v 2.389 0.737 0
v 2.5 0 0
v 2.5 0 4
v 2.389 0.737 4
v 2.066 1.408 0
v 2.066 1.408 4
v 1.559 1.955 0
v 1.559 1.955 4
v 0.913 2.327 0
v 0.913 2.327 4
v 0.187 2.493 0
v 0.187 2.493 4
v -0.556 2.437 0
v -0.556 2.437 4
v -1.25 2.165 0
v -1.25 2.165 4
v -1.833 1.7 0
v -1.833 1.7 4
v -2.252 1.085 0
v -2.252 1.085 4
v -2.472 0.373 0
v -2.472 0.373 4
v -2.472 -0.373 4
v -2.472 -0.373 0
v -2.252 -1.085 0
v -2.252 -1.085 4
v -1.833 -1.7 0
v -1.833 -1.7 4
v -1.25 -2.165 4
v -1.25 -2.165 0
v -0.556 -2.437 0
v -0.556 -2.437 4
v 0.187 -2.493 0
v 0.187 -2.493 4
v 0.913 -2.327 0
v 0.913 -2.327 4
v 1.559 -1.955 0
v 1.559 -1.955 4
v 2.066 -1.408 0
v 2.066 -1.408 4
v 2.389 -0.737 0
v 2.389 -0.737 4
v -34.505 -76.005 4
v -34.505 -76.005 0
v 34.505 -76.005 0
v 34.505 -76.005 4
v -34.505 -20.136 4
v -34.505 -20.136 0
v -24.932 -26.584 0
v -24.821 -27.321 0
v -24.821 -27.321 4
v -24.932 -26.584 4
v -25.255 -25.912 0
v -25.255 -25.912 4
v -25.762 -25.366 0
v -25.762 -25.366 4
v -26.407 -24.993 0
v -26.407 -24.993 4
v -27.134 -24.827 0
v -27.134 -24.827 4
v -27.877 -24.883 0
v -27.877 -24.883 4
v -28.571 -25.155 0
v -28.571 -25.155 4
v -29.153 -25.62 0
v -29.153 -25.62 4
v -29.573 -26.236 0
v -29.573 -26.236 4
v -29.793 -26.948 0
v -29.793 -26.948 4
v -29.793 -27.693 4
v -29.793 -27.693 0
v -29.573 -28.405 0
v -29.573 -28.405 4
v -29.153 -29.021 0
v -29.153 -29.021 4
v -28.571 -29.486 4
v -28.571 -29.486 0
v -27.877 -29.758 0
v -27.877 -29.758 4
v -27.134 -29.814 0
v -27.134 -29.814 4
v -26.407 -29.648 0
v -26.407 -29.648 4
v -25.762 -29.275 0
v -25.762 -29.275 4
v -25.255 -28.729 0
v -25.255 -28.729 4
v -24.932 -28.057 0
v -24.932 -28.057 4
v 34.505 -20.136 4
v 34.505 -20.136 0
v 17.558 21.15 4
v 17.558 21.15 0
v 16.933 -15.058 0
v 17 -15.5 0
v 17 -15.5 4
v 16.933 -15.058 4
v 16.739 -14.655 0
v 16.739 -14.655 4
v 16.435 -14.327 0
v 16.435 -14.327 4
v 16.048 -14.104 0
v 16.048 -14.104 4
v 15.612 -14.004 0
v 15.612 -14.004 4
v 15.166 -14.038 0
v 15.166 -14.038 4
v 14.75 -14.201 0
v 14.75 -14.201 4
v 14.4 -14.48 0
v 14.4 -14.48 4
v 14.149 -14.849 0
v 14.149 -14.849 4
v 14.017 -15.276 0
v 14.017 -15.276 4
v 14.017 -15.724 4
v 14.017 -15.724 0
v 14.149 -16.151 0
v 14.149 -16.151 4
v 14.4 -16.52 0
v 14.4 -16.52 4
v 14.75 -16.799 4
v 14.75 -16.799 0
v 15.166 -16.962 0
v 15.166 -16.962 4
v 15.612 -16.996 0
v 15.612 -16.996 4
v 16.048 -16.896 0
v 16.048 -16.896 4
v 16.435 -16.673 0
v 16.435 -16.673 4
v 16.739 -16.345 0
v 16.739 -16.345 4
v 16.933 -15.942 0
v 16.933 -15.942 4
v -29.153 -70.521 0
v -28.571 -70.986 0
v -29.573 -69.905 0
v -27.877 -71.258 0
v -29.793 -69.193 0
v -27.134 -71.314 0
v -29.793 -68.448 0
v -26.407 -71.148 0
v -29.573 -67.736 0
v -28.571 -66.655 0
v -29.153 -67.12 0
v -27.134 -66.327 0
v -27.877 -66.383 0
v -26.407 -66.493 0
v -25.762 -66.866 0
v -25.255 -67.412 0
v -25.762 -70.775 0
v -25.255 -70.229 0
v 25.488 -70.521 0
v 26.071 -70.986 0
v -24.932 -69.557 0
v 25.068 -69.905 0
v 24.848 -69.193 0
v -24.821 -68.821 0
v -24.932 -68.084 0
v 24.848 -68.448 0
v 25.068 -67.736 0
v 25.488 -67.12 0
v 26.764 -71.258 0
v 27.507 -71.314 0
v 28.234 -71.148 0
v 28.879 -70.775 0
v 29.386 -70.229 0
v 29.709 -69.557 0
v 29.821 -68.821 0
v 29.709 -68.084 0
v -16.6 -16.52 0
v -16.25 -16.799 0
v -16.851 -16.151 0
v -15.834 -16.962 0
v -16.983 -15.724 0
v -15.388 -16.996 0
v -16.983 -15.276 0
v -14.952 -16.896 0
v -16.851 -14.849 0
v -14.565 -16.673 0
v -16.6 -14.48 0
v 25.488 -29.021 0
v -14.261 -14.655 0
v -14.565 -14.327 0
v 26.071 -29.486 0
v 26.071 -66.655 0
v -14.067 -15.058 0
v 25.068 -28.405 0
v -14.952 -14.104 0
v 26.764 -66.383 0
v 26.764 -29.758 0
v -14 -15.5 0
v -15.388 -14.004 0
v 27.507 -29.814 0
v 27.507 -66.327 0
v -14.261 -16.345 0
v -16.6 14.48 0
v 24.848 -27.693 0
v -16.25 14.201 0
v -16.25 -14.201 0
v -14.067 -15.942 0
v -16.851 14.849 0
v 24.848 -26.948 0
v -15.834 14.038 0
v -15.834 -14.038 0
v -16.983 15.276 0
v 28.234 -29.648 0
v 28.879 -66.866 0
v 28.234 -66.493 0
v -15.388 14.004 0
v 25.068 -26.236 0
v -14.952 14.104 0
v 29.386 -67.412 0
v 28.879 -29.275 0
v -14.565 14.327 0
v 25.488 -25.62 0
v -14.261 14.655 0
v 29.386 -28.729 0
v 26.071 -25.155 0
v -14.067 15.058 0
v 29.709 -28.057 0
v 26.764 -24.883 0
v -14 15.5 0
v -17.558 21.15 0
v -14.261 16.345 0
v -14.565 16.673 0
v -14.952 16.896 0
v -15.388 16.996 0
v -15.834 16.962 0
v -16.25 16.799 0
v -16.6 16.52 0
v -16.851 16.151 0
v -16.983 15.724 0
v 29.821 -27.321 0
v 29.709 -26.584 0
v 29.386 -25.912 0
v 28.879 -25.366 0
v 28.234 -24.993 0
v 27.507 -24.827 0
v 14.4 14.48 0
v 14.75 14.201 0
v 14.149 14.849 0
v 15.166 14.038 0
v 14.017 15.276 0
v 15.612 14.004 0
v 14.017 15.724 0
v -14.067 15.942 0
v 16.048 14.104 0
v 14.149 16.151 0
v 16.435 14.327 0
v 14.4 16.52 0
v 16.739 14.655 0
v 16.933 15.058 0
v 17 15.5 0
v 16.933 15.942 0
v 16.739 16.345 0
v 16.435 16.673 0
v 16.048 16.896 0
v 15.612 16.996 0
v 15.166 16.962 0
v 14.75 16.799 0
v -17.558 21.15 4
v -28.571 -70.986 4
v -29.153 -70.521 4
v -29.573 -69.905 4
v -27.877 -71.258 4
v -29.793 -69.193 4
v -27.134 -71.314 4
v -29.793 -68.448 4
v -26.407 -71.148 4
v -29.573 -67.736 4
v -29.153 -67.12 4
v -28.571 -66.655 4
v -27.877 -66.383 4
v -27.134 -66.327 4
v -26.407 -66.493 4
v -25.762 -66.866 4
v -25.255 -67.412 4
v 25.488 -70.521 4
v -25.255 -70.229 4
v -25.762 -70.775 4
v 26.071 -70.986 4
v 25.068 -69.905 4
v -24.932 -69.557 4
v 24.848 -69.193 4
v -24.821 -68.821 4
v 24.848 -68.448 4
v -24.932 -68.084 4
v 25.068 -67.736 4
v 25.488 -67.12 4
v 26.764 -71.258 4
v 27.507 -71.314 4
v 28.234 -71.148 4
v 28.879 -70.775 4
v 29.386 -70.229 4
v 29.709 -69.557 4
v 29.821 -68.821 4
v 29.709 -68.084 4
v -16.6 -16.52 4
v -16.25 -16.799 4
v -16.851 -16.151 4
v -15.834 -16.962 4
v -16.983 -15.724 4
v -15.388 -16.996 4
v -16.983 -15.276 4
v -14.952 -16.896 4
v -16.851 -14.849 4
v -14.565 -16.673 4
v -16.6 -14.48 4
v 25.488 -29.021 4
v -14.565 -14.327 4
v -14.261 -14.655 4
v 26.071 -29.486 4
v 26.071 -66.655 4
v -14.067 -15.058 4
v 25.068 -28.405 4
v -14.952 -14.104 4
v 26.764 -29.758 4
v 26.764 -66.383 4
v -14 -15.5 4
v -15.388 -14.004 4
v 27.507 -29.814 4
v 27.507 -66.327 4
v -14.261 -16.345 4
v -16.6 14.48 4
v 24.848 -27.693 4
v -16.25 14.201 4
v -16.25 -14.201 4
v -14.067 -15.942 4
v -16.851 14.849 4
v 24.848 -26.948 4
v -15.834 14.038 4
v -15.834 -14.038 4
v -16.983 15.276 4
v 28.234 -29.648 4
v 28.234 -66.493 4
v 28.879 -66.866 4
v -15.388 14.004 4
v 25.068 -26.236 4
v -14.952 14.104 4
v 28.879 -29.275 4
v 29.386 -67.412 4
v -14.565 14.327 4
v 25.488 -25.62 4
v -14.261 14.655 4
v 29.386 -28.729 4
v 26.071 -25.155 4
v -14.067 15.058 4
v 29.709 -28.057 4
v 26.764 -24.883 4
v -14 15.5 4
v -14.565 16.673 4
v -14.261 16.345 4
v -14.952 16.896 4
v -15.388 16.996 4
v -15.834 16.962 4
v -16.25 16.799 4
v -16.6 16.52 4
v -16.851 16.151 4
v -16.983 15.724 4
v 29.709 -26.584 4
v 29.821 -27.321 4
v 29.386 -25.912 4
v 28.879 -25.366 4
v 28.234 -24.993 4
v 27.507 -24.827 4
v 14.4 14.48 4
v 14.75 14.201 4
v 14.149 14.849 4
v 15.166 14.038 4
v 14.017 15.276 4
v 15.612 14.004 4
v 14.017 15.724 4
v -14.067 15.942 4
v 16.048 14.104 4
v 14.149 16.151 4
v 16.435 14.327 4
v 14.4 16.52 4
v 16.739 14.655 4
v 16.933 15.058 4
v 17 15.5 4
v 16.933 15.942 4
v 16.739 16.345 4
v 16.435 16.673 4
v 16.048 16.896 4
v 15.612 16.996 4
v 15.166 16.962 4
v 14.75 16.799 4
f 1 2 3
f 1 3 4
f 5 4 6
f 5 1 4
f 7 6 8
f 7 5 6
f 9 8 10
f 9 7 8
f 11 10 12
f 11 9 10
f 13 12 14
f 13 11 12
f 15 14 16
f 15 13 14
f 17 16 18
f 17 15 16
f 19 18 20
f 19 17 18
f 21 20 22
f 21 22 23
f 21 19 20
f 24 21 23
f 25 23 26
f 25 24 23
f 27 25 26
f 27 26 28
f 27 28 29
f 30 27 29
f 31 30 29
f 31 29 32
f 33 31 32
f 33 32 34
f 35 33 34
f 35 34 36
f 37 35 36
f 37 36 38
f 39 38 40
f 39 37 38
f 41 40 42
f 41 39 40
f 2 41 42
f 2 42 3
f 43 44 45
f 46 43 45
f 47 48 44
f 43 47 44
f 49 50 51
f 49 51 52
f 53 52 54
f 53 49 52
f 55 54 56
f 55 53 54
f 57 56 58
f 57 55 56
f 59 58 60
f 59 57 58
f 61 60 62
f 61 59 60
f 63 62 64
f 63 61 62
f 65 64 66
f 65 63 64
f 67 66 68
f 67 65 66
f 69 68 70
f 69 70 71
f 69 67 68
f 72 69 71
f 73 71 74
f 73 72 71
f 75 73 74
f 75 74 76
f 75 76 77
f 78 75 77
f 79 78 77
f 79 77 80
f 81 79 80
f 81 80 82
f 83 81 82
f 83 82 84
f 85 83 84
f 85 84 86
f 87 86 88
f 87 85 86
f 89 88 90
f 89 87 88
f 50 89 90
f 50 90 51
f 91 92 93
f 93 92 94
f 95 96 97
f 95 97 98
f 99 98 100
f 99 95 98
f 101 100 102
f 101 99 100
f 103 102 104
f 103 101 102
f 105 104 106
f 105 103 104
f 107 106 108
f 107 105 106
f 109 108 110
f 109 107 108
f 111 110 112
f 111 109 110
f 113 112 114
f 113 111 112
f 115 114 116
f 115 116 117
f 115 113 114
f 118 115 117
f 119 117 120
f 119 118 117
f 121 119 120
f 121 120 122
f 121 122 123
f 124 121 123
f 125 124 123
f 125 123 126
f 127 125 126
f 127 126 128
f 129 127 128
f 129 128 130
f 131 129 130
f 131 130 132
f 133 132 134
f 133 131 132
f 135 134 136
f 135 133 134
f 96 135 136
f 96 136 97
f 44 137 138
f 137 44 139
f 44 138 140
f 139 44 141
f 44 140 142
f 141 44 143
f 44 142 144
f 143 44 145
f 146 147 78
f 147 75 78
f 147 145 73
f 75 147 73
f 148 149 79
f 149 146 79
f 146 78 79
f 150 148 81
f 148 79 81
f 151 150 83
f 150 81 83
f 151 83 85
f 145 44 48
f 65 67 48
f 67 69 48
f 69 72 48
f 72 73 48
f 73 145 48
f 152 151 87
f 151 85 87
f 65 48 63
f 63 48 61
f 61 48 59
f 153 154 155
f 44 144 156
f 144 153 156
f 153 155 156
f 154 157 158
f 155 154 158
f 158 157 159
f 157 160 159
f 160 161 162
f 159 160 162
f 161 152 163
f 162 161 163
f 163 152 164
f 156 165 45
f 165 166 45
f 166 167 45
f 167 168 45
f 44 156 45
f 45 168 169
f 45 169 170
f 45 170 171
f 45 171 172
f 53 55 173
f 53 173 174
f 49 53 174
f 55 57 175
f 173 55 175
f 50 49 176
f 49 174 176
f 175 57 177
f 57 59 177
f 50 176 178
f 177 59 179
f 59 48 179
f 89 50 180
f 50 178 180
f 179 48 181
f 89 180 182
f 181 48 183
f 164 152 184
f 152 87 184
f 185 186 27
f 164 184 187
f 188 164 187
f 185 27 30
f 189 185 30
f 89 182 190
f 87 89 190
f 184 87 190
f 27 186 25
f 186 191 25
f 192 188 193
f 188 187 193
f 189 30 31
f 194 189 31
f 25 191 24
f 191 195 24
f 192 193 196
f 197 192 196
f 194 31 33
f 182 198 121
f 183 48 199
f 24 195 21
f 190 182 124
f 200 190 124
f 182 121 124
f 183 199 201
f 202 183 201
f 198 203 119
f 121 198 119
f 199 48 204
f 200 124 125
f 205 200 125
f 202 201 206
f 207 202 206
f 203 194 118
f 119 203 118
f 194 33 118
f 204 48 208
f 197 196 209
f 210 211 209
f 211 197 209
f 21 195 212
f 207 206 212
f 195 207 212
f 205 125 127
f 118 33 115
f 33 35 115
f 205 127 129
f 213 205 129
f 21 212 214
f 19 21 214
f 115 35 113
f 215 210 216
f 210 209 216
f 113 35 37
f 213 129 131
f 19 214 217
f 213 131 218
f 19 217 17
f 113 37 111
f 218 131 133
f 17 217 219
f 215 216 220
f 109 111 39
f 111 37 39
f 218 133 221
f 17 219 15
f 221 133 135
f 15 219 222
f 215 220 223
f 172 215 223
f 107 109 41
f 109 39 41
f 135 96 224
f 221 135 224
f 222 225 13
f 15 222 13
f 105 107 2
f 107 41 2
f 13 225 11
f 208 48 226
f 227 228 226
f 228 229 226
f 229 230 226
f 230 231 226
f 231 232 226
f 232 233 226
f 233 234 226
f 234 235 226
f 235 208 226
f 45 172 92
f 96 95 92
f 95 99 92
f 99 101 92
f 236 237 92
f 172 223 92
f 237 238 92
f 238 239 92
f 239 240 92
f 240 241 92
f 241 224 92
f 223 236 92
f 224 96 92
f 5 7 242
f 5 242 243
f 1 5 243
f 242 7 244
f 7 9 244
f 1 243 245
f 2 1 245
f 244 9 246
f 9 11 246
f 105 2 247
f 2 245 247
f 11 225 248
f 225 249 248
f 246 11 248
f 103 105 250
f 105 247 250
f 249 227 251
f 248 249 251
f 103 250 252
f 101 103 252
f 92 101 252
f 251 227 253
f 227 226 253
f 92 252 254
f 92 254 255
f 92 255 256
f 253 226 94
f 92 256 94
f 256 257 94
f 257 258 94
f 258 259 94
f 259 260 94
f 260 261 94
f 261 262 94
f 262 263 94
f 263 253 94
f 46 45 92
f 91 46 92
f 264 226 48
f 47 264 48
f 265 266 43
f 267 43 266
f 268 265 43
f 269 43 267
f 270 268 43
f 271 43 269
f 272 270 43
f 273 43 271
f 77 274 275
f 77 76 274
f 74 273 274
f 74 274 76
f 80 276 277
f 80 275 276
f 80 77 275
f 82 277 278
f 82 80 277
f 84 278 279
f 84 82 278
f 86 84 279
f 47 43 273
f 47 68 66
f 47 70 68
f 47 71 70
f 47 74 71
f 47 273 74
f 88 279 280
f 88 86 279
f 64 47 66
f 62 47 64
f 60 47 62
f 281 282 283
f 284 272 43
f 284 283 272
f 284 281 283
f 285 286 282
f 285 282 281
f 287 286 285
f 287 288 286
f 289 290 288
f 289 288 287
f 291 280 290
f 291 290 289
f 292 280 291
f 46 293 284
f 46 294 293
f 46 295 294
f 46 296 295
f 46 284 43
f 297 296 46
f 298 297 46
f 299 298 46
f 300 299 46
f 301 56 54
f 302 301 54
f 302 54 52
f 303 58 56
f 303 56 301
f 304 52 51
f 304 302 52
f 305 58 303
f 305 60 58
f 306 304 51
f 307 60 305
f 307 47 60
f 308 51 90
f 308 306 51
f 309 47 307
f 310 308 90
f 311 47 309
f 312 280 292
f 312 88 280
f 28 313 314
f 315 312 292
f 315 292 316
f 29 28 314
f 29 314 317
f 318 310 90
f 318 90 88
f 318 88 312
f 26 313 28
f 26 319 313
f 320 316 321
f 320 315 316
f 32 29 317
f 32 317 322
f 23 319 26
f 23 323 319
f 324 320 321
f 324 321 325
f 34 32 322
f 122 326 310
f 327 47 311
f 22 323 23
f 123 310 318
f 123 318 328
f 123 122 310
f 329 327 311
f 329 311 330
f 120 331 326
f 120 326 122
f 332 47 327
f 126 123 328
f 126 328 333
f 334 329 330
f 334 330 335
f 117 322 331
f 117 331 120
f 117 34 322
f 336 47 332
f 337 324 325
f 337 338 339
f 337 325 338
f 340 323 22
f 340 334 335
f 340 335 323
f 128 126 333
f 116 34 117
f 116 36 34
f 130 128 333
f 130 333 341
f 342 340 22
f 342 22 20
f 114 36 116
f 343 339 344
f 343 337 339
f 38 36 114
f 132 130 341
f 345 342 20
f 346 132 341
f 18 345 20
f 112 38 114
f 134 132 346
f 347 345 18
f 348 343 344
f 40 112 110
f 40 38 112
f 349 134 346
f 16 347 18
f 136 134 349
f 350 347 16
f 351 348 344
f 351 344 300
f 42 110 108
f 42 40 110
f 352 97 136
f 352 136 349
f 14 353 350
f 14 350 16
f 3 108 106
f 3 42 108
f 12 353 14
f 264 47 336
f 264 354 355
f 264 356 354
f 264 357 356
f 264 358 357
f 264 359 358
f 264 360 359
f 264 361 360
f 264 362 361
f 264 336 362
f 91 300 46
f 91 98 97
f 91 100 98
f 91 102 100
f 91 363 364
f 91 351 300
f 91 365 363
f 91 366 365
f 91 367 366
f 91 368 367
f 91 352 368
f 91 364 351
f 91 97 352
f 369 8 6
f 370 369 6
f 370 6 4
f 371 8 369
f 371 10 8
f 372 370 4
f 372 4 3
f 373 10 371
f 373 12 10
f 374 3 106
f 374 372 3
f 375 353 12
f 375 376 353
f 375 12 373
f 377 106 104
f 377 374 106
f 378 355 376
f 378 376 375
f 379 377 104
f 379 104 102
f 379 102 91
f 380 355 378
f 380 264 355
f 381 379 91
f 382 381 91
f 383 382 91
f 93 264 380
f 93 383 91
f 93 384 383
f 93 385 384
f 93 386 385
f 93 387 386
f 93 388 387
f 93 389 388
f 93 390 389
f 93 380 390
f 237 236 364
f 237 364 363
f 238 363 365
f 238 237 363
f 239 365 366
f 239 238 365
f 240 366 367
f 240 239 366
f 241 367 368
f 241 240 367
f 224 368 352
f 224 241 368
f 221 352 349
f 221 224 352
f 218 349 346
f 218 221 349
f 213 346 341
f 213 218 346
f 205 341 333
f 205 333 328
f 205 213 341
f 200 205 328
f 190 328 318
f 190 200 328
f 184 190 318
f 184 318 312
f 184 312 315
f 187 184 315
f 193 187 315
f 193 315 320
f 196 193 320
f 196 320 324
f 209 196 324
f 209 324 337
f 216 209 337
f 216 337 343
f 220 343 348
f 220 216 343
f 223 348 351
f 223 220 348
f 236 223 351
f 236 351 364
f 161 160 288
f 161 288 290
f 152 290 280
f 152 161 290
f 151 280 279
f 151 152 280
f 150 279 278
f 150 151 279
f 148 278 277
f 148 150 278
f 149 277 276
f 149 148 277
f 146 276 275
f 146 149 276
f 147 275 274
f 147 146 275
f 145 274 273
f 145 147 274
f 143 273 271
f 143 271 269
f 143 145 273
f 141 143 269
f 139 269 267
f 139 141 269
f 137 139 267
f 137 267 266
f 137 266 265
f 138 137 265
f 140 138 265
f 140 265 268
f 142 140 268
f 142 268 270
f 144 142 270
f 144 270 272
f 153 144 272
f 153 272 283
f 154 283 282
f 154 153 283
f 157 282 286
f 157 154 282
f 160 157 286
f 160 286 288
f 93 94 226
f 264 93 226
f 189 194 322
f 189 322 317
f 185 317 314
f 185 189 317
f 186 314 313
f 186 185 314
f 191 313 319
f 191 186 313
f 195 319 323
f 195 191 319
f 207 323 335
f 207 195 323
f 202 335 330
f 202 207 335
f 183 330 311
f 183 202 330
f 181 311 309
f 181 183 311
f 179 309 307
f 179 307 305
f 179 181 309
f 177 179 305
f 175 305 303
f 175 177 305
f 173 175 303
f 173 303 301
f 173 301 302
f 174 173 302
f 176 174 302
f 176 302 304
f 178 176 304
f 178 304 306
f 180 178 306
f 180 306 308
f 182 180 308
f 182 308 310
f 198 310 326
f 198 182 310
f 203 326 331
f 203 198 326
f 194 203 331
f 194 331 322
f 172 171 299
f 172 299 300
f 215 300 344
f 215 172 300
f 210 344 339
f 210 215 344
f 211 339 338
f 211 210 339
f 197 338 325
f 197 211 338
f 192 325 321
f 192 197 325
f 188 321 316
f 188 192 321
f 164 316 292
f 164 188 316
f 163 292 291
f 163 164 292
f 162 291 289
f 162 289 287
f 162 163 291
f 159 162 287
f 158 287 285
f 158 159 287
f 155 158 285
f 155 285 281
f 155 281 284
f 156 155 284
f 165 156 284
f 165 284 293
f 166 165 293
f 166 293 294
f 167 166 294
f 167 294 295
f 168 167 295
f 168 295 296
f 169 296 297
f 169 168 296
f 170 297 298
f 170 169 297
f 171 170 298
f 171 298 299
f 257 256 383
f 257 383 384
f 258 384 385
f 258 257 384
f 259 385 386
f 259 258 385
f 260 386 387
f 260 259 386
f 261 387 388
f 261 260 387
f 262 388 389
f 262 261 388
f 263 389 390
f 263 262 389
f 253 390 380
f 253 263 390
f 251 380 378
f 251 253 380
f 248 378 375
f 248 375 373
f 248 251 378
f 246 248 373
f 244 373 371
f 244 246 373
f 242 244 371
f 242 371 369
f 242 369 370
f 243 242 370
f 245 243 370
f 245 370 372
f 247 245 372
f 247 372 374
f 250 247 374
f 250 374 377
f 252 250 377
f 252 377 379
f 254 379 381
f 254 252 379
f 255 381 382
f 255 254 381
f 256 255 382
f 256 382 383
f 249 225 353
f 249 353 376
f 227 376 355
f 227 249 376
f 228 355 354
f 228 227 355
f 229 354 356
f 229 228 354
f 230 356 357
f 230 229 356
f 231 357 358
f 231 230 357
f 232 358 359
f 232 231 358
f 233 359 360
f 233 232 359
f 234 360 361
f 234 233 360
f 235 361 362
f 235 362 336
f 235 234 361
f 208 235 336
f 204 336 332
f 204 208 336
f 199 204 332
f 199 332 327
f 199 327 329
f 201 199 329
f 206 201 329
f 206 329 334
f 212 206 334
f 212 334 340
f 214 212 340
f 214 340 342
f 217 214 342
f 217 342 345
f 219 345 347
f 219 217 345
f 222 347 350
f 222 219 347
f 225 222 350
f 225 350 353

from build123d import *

# Parameters (mm, degrees)
SKETCH4_R           = 2.5
SKETCH4_R_2         = 1.5
BOSS_EXTRUDE1_DEPTH = 4


with BuildPart() as part:
    # Sketch4 → Boss-Extrude1 (new body)
    with BuildSketch(Plane.XY):
        Polygon((-34.504712973, -20.136303179), (-34.504712973, -76.004712973), (34.504712973, -76.004712973), (34.504712973, -20.136303179), (17.557897552, 21.15), (-17.557897552, 21.15), align=None)
        with Locations((-27.320508076, -27.320508076)):
            Circle(SKETCH4_R, mode=Mode.SUBTRACT)
        with Locations((27.320508076, -27.320508076)):
            Circle(SKETCH4_R, mode=Mode.SUBTRACT)
        with Locations((27.320508076, -68.820508076)):
            Circle(SKETCH4_R, mode=Mode.SUBTRACT)
        with Locations((-27.320508076, -68.820508076)):
            Circle(SKETCH4_R, mode=Mode.SUBTRACT)
        with Locations((-15.5, -15.5)):
            Circle(SKETCH4_R_2, mode=Mode.SUBTRACT)
        with Locations((-15.5, 15.5)):
            Circle(SKETCH4_R_2, mode=Mode.SUBTRACT)
        with Locations((15.5, 15.5)):
            Circle(SKETCH4_R_2, mode=Mode.SUBTRACT)
        with Locations((15.5, -15.5)):
            Circle(SKETCH4_R_2, mode=Mode.SUBTRACT)
        Circle(SKETCH4_R, mode=Mode.SUBTRACT)
    extrude(amount=BOSS_EXTRUDE1_DEPTH)


solid = part.part
